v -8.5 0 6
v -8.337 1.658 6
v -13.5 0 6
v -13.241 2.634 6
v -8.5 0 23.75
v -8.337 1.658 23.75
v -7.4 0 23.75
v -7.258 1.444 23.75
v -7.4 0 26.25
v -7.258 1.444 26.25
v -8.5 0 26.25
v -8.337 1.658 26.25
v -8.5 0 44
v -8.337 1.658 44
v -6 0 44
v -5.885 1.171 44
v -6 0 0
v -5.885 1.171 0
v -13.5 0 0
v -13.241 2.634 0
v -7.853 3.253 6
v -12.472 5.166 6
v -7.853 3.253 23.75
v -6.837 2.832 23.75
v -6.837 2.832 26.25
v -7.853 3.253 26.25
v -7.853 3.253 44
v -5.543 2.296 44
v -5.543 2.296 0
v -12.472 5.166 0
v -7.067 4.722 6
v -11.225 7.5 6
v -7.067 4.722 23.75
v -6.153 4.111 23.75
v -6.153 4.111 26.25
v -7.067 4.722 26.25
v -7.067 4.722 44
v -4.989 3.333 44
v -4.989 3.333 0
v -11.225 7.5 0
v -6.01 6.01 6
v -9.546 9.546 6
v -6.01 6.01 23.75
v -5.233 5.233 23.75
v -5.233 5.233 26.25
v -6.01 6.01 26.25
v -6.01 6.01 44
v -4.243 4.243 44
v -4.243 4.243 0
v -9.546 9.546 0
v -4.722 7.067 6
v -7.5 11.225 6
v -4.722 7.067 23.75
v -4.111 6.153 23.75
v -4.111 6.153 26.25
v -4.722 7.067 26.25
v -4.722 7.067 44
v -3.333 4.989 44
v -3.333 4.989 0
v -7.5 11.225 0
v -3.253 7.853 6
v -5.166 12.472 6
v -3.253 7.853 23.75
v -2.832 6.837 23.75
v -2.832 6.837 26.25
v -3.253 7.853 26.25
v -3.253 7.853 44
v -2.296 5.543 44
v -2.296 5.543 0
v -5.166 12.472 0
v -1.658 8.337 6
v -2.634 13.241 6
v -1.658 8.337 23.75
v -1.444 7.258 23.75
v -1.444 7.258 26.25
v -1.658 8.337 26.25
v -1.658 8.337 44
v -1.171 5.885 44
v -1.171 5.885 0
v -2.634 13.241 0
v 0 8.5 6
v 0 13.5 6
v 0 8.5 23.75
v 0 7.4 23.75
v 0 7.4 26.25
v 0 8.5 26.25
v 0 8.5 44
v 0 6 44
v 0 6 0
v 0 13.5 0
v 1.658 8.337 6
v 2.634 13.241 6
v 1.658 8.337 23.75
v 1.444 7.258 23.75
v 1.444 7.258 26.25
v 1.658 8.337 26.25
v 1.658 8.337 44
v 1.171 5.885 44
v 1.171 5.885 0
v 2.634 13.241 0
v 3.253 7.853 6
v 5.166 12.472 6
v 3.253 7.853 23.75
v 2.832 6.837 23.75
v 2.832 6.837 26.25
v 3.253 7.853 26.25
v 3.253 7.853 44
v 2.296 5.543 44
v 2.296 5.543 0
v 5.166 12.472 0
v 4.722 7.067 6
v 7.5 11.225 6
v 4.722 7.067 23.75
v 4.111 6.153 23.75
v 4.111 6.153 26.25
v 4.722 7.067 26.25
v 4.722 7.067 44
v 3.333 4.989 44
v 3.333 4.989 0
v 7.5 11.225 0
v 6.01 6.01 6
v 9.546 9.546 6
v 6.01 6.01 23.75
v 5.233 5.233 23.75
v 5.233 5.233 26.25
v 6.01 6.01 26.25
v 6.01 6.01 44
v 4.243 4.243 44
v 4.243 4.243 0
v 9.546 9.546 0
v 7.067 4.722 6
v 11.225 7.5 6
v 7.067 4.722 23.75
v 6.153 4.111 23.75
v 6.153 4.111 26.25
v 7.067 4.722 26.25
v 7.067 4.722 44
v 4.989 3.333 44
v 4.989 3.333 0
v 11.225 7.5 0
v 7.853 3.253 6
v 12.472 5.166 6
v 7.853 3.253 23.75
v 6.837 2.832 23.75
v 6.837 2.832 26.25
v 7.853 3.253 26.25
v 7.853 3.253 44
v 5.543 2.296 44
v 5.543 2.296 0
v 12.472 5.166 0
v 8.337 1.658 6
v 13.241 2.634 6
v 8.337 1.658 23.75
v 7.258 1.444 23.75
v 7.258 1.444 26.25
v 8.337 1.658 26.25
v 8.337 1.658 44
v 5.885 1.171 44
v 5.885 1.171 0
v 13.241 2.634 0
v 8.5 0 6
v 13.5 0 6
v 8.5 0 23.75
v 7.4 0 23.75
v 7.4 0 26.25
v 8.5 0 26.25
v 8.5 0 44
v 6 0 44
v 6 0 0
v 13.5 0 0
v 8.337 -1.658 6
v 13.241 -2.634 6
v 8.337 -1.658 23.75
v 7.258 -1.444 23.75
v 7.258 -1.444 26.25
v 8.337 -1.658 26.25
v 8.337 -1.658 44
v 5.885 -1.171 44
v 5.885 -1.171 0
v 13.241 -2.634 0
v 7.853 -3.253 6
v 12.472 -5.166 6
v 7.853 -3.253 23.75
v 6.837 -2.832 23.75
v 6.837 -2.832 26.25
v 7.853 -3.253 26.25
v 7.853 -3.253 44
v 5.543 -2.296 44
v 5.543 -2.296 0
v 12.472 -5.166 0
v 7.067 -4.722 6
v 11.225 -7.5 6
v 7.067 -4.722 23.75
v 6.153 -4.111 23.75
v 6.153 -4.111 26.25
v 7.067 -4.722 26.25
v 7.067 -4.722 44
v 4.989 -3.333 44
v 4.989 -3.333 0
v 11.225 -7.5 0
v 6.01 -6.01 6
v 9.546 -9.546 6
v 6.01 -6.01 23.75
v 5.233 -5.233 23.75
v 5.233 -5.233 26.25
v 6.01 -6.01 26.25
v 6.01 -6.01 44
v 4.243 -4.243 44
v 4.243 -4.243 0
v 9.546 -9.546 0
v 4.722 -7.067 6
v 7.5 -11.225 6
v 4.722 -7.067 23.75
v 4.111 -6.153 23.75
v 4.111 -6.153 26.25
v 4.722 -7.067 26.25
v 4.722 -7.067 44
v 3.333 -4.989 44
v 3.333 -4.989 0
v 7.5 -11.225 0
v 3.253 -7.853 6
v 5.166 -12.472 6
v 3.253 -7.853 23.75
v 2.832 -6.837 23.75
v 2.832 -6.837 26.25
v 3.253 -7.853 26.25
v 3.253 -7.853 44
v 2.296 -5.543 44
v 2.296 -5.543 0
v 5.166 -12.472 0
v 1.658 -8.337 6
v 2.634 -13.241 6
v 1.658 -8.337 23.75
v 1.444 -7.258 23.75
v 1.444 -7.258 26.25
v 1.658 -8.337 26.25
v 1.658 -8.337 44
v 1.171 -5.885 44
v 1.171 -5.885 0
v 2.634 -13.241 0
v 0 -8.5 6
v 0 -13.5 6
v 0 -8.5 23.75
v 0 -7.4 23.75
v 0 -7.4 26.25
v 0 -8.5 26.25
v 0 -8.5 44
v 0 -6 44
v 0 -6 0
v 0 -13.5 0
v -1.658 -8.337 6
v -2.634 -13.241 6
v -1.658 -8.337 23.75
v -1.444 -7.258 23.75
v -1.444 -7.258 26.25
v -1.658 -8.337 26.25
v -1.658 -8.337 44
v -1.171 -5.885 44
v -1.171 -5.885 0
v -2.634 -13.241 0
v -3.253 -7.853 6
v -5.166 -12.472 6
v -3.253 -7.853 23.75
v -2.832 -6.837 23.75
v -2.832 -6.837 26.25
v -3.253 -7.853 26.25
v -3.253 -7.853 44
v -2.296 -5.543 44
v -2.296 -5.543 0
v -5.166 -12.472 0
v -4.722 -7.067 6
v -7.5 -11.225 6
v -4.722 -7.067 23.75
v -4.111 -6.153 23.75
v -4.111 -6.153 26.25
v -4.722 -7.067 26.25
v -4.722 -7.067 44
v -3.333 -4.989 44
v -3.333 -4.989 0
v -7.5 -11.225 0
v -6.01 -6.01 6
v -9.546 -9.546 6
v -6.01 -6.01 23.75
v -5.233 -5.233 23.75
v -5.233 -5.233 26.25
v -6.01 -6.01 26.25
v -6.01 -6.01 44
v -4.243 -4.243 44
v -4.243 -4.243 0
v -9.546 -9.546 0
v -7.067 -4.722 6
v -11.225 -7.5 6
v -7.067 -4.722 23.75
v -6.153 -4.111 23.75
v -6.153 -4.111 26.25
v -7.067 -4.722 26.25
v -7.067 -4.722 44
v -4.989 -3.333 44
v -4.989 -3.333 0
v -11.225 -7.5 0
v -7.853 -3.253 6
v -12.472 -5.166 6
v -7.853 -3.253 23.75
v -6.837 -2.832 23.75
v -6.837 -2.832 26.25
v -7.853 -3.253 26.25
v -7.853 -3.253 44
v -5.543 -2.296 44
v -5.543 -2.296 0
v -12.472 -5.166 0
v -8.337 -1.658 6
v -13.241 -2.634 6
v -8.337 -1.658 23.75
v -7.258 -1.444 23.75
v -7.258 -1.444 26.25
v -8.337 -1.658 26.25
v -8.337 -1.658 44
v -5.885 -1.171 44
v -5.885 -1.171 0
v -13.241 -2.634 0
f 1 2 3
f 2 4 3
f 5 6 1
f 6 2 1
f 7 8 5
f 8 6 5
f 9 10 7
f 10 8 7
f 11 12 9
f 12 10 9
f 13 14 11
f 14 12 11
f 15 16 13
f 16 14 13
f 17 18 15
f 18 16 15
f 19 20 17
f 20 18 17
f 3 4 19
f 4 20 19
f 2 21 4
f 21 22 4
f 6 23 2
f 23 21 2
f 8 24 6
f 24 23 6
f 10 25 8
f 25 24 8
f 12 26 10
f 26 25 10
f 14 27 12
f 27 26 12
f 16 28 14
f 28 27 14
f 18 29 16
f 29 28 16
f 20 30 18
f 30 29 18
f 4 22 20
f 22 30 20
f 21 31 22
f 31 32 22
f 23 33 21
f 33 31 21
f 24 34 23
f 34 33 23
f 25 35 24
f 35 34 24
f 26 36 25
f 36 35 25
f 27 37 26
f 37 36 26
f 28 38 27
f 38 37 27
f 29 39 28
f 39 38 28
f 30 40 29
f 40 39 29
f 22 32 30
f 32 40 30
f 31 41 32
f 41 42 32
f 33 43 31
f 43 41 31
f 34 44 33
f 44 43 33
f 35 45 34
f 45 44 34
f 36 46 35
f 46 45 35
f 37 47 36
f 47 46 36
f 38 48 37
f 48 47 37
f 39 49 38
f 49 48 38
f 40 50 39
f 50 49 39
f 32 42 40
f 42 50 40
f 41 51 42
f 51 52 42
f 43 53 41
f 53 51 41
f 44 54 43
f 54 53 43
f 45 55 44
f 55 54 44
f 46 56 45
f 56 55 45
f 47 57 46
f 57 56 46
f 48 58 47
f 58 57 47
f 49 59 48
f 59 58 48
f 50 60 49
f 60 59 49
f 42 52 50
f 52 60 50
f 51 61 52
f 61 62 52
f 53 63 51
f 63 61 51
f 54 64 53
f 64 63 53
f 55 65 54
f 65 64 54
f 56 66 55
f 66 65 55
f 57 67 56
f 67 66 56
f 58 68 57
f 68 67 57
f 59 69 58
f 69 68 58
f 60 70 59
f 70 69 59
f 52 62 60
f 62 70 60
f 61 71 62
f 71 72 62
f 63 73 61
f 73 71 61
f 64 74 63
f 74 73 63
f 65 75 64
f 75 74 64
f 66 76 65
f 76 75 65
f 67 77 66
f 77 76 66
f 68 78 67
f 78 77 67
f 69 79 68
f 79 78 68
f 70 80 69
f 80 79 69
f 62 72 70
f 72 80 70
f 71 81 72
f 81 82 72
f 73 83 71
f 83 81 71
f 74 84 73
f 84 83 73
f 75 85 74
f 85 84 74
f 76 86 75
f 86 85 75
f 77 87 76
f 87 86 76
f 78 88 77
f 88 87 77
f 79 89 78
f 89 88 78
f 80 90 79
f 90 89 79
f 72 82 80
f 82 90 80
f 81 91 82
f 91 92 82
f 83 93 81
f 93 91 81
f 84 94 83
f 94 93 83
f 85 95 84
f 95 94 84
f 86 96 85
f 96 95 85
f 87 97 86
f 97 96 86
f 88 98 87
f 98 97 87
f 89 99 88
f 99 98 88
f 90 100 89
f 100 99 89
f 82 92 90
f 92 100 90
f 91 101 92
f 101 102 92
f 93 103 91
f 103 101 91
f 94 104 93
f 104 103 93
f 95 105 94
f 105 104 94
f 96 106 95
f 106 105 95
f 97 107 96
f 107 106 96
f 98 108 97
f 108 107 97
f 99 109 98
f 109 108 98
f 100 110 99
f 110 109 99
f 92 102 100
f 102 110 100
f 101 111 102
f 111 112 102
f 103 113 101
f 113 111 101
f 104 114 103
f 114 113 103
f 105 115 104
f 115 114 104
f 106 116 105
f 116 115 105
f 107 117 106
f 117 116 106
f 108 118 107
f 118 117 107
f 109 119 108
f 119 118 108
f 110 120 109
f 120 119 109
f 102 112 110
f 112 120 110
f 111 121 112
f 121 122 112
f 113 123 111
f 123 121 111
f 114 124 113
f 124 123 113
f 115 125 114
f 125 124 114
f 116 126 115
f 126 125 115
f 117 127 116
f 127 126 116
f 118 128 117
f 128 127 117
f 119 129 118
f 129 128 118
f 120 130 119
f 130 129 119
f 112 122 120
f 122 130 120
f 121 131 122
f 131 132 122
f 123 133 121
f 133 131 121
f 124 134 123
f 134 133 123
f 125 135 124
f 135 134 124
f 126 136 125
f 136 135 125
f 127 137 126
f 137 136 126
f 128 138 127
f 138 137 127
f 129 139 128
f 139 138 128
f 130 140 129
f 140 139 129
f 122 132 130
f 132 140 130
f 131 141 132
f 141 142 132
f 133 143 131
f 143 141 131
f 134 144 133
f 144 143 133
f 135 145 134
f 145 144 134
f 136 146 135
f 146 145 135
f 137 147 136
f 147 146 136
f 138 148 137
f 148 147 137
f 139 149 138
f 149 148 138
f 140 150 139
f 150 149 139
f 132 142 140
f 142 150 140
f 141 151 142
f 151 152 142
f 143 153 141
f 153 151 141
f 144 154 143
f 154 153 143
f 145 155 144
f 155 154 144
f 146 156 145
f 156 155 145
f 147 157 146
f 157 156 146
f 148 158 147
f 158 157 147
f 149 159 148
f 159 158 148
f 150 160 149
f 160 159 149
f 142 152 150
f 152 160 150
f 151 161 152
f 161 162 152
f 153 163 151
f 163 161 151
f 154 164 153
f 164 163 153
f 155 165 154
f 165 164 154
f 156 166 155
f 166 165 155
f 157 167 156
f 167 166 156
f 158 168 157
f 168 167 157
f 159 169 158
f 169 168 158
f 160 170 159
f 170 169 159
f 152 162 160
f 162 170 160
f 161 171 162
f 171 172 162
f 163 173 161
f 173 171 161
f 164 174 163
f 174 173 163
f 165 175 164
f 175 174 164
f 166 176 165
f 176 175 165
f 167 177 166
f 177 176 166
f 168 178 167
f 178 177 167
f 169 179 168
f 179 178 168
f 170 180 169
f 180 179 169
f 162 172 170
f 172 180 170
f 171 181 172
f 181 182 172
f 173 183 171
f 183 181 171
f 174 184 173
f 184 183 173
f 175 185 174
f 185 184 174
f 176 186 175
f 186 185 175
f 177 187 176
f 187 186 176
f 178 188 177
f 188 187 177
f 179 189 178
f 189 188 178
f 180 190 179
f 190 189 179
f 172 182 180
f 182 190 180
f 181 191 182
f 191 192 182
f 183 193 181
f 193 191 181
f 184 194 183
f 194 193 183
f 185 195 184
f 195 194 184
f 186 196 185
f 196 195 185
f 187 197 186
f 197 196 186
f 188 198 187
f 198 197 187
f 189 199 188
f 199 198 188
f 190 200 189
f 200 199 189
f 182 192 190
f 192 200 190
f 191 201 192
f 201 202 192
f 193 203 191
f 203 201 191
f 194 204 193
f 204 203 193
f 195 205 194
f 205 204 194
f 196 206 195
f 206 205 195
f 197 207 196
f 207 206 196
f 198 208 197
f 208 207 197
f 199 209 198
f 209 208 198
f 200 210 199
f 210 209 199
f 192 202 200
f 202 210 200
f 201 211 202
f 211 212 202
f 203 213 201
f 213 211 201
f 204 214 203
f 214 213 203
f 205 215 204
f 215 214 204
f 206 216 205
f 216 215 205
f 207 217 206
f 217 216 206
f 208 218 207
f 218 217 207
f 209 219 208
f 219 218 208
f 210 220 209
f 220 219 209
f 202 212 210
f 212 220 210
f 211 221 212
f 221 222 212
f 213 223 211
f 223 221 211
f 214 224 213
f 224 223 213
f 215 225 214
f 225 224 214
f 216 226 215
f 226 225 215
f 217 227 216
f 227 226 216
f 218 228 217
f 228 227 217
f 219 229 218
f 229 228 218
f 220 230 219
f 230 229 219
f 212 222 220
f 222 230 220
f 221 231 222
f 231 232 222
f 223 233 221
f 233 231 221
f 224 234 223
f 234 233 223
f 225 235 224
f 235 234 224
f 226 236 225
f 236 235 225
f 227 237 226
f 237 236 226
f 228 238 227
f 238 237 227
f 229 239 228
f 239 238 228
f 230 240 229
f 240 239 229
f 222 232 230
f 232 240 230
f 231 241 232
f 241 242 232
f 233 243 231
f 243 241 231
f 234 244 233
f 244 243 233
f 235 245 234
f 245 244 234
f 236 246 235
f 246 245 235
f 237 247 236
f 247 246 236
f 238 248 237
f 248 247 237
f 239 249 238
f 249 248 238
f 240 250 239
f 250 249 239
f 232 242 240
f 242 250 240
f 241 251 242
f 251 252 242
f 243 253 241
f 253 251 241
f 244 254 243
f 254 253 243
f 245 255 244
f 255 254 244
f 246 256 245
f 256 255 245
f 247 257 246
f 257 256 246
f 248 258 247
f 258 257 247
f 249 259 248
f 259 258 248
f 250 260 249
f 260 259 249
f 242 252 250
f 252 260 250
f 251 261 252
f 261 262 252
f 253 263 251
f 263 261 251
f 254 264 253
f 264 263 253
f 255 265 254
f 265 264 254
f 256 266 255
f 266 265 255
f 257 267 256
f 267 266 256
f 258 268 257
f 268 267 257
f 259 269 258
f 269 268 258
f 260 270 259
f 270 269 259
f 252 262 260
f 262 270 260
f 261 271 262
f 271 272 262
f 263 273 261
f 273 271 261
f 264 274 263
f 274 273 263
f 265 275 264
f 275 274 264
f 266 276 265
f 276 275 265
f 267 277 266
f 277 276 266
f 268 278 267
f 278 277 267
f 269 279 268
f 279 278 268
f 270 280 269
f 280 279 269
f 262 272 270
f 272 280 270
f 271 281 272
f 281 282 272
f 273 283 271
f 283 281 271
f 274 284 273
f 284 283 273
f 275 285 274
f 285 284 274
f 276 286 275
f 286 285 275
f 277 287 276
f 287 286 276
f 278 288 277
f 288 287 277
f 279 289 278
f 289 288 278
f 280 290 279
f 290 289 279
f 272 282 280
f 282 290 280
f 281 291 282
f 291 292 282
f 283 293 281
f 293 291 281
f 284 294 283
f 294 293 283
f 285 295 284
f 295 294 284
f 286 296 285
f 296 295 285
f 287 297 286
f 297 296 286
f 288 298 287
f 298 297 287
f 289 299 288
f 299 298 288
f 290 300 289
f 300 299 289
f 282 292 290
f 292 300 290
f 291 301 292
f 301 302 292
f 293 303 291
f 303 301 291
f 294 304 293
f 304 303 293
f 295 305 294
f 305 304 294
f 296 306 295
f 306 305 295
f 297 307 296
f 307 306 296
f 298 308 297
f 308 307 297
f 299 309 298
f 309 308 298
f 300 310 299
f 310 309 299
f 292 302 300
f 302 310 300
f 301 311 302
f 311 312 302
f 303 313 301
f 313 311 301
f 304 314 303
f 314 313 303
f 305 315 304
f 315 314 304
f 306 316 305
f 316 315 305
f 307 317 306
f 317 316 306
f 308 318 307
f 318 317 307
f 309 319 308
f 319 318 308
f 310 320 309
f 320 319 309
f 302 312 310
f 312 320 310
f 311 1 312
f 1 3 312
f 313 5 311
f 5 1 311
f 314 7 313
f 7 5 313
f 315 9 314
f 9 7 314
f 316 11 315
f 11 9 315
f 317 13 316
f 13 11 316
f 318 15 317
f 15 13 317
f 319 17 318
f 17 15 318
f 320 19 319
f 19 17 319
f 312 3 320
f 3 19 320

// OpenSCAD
$fn = 32;

// ----------------------------------------------------------------------
// Grooved revolve: flanged, bore R6
// ----------------------------------------------------------------------

// --- parameters (mm) ---
bore_r = 6;               // bore radius
outer_r = 8.5;            // outer radius of the body
total_h = 44;             // overall height, Z
wall = 2.5;               // radial wall thickness
groove_w = 2.5;           // groove width
groove_d = 1.1;           // groove depth
grooves = 1;              // number of outer grooves
flange_r = 13.5;          // flange radius
flange_h = 6;             // flange height

bbox_x = 2 * flange_r;  // full diameter
bore_d = 2 * bore_r;  // bore diameter
body_d = 2 * outer_r;  // body diameter
flange_d = 2 * flange_r;  // flange diameter
revolve_angle = 360;  // full turn around the Z axis

profile = [[6, 0], [8.5, 0], [13.5, 0], [13.5, 6], [8.5, 6], [8.5, 23.75], [7.4, 23.75], [7.4, 26.25], [8.5, 26.25], [8.5, 44], [6, 44]];  // primary outline, 11 points, counter clockwise

// --- the one profile operation ---
rotate_extrude(angle = revolve_angle) polygon(points = profile);
